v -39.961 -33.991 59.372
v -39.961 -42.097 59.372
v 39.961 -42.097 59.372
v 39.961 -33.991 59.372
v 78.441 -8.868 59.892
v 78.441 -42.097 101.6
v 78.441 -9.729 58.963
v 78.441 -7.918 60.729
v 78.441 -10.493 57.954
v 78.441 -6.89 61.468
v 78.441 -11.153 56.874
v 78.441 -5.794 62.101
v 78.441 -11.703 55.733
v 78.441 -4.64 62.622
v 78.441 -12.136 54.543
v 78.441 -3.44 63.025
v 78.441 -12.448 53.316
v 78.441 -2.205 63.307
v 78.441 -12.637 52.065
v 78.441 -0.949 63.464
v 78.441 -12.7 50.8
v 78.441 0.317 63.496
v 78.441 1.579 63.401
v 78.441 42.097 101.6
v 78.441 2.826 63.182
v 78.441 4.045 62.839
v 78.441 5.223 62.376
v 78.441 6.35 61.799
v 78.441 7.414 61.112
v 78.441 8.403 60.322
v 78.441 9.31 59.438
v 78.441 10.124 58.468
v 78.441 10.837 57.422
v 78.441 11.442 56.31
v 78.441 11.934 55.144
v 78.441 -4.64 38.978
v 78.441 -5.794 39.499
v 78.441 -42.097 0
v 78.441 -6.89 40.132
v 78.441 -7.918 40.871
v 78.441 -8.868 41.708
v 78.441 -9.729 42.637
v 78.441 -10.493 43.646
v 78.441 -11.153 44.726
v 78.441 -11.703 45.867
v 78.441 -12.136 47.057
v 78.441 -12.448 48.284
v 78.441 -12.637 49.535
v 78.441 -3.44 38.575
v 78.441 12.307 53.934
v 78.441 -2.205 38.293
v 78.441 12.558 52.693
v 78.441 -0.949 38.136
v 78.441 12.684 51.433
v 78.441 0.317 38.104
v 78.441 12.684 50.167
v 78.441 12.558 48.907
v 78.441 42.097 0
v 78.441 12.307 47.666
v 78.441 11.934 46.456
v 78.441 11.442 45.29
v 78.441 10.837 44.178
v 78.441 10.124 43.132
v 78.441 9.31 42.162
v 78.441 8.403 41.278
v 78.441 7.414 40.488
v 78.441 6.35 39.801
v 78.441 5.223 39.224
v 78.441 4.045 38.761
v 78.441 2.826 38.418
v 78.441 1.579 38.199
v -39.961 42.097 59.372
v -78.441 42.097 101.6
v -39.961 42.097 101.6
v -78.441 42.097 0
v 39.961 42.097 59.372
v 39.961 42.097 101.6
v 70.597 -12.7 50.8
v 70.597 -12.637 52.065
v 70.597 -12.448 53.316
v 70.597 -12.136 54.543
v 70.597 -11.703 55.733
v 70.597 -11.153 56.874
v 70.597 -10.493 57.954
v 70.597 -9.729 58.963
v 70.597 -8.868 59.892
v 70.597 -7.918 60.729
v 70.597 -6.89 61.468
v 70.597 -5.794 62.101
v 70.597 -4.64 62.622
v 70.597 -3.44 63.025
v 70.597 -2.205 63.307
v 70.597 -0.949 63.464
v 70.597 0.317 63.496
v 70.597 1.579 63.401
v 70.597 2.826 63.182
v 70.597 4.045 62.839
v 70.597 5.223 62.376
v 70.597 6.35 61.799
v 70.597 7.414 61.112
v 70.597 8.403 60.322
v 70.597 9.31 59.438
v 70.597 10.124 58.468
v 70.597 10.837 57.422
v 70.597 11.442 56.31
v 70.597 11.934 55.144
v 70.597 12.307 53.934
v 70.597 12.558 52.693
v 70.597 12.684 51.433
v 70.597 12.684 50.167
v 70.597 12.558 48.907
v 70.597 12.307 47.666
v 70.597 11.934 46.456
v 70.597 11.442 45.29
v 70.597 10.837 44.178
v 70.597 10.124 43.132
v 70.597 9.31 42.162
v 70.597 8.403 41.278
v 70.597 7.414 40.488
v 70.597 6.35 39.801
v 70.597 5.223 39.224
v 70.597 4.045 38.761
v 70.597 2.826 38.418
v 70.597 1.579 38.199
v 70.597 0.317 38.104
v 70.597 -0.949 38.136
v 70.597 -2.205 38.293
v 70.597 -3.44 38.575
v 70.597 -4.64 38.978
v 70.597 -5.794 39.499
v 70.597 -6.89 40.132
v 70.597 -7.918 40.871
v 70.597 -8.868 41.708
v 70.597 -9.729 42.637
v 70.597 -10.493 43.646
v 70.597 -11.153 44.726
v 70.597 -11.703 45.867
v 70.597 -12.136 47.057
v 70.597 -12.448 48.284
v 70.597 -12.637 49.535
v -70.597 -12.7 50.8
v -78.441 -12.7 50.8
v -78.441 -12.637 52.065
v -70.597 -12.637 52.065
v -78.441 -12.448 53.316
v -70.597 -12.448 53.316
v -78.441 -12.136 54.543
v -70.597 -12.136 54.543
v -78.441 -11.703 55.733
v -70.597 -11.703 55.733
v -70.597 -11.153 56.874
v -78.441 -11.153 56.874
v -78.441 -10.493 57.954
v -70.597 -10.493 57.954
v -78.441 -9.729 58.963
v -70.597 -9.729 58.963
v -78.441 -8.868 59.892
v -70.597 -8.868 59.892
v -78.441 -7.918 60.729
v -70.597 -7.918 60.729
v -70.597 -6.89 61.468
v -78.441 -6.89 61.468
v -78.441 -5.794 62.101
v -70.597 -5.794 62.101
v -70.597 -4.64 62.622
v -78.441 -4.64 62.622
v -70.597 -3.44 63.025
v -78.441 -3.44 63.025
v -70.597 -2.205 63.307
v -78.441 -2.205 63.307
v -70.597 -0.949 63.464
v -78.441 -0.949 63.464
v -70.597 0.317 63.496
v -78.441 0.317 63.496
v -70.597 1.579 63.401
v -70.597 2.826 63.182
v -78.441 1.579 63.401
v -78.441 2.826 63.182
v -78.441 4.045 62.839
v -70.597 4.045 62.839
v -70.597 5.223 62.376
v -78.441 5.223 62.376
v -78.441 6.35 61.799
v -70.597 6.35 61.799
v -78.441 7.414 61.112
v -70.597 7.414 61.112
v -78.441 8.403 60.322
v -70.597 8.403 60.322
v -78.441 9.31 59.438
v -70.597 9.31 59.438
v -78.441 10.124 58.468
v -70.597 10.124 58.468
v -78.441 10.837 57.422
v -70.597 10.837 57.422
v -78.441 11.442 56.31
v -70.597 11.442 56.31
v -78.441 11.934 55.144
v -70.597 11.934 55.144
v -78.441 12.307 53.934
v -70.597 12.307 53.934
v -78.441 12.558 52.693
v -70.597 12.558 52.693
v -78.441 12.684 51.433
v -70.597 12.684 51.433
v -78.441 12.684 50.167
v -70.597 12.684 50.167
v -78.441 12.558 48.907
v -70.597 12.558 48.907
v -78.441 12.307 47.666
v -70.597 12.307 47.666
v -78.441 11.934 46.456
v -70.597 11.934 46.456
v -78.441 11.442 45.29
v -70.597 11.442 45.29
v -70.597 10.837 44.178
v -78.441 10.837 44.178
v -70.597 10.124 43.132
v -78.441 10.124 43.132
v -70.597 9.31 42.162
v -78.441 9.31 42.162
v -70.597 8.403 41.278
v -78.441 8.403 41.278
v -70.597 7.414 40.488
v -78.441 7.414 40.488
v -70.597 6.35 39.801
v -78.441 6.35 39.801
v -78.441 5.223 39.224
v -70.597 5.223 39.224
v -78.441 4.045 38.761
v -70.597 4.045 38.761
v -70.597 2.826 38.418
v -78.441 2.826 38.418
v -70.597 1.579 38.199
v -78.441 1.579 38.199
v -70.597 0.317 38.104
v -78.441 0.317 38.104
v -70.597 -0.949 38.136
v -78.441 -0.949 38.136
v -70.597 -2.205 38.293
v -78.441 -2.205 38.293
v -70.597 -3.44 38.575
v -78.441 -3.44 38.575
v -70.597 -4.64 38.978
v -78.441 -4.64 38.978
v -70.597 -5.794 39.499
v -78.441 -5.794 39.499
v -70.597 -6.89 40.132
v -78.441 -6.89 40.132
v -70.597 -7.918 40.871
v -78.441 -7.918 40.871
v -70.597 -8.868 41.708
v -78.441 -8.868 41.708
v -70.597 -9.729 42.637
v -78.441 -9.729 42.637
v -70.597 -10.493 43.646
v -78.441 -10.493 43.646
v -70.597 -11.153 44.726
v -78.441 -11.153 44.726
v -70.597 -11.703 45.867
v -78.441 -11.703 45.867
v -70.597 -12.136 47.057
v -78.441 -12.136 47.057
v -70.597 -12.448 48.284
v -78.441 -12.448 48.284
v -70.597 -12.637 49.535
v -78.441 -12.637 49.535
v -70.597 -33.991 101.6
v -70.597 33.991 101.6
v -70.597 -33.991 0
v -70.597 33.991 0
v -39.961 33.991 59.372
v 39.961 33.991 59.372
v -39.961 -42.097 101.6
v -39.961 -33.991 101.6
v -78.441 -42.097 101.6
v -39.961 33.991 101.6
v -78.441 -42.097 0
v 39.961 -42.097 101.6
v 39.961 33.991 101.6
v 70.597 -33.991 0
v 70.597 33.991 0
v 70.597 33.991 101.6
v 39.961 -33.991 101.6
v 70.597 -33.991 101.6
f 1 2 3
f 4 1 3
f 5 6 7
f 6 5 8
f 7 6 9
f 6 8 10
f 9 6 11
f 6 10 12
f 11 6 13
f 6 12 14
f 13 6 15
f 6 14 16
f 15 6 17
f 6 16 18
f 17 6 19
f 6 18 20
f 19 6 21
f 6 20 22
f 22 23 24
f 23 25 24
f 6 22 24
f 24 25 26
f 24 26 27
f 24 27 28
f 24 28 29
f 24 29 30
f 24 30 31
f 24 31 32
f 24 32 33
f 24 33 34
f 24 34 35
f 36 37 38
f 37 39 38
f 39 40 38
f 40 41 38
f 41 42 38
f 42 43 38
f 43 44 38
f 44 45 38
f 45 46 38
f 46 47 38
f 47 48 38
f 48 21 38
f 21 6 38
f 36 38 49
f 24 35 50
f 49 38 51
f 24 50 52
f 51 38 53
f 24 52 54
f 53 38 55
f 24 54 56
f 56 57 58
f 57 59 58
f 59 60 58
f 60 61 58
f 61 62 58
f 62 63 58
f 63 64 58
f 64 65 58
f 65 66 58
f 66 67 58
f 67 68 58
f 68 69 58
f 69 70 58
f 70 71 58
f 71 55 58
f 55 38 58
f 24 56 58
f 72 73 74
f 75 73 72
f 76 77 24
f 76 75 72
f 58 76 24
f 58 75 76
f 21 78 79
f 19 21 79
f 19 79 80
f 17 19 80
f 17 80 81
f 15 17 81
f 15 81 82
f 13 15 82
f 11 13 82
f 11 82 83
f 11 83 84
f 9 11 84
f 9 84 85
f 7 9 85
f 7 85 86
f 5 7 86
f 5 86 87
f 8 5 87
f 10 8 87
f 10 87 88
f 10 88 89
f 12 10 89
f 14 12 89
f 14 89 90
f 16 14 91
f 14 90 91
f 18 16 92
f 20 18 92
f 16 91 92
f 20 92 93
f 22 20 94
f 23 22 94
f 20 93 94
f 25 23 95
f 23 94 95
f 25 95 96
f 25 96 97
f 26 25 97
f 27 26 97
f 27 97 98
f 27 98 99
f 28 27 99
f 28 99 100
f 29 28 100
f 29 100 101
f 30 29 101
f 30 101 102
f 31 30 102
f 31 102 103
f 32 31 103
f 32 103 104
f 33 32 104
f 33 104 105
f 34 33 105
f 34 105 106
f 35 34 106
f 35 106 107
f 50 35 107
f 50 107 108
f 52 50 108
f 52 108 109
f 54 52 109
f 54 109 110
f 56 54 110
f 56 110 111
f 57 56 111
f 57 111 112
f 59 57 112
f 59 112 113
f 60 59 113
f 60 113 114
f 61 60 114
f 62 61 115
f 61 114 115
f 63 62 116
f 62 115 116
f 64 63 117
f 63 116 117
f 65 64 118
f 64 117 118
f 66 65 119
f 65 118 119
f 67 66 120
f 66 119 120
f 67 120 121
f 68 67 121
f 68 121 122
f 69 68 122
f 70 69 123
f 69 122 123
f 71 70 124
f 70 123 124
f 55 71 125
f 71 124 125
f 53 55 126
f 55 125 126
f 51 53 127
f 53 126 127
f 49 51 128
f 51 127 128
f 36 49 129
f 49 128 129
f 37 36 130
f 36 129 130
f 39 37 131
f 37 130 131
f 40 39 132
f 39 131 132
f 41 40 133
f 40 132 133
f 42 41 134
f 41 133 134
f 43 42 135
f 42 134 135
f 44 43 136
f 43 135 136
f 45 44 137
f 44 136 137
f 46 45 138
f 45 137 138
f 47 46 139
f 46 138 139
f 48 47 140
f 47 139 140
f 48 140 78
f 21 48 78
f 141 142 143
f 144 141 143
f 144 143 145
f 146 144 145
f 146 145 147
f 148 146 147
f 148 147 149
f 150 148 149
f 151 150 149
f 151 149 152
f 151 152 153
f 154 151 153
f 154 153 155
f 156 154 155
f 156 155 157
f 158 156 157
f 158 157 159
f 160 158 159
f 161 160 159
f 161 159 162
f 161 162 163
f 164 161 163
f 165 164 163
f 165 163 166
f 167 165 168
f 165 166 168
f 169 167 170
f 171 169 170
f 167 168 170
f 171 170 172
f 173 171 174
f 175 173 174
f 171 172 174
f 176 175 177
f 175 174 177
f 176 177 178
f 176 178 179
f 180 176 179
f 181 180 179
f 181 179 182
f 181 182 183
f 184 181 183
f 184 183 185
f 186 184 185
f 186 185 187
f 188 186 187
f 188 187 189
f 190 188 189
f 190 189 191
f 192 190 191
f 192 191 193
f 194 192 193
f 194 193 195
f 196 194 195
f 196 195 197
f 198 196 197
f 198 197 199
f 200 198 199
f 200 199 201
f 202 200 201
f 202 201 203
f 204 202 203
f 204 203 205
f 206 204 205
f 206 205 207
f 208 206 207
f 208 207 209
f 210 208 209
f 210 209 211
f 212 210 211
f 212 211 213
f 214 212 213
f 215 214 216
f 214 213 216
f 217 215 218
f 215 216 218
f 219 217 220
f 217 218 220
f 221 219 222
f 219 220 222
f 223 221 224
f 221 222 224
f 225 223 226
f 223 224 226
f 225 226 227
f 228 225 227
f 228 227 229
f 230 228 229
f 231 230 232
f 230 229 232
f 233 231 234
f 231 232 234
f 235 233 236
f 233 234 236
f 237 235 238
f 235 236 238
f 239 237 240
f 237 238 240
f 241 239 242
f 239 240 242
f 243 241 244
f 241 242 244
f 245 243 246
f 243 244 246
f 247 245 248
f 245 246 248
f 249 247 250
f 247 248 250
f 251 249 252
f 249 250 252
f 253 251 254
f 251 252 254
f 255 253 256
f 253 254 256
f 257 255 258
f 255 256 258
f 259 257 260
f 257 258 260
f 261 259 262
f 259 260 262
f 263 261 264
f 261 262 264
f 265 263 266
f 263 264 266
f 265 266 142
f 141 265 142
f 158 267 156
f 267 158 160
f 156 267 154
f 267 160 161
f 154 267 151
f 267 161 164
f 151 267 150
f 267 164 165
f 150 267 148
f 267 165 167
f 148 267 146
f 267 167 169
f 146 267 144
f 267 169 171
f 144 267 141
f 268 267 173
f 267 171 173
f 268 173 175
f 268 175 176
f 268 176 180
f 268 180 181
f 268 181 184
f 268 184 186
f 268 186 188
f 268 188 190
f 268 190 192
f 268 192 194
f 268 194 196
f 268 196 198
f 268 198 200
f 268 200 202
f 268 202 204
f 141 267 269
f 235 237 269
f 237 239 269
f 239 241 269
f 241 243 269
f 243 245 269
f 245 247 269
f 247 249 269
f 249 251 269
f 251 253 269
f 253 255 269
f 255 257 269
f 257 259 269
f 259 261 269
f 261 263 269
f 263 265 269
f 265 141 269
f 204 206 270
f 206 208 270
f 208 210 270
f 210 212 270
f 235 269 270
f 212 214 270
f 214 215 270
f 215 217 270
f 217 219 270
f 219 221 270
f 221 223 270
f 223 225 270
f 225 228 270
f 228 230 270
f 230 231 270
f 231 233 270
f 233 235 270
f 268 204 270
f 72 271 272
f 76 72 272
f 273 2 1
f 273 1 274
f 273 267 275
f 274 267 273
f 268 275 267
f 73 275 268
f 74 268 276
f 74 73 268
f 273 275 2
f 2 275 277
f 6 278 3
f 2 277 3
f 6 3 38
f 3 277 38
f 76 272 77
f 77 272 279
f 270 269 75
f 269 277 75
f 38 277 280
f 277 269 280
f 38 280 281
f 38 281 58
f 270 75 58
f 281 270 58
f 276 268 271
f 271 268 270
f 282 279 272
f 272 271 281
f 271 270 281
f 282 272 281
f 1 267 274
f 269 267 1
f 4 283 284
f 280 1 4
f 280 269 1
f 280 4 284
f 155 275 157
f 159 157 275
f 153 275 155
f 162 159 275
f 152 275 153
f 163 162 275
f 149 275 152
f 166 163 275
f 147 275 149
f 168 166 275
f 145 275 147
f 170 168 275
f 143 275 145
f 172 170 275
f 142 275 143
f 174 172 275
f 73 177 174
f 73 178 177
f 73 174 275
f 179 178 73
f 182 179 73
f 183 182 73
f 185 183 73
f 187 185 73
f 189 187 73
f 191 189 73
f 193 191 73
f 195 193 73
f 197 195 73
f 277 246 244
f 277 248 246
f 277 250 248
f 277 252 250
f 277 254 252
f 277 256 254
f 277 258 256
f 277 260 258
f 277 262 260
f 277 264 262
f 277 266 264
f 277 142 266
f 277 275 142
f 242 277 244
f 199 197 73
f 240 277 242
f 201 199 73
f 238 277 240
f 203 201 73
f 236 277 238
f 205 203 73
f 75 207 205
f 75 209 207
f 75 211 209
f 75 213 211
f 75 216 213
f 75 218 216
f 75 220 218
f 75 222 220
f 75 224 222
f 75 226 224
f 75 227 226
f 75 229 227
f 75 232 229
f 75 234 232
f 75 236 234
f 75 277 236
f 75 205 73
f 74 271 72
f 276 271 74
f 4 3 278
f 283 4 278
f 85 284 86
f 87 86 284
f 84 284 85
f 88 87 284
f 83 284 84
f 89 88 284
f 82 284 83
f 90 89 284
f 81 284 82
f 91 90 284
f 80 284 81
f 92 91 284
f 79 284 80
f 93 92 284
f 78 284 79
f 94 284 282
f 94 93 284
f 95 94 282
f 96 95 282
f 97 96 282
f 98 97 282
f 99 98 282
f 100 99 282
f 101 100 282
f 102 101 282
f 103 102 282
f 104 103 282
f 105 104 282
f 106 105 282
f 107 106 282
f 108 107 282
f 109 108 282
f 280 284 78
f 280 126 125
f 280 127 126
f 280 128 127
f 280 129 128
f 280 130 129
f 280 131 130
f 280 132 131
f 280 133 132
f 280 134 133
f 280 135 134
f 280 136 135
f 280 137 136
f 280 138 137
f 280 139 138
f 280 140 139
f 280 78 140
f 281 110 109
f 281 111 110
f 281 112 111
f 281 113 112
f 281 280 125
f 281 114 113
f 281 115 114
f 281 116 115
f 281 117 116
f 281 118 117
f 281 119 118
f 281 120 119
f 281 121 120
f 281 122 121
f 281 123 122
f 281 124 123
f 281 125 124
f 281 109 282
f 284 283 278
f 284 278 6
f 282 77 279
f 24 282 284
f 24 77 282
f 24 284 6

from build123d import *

# Parameters (mm, degrees)
F0_W     = 156.882346
F0_H     = 84.193528
F0_W_2   = 141.194134
F0_H_2   = 67.982354
F1_DEPTH = 101.6
F2_W     = 79.92284
F2_H     = 42.2275
F3_DEPTH = 190.754
F5_D     = 25.4


with BuildPart() as f1:
    # F0 (on Top) → F1 (new body)
    with BuildSketch(Plane.XY):
        Rectangle(F0_W, F0_H)
        Rectangle(F0_W_2, F0_H_2, mode=Mode.SUBTRACT)
    extrude(amount=F1_DEPTH)

    # F2 (on face) → F3 (cut, symmetric)
    with BuildSketch(Plane.XZ.offset(42.096764)):
        with Locations((0, 80.48625)):
            Rectangle(F2_W, F2_H)
    extrude(amount=F3_DEPTH, both=True, mode=Mode.SUBTRACT)

    # F5 (through all)
    with Locations(Plane.YZ.offset(78.441173)):
        with Locations((0, 50.8)):
            Hole(F5_D / 2)


solid = f1.part
